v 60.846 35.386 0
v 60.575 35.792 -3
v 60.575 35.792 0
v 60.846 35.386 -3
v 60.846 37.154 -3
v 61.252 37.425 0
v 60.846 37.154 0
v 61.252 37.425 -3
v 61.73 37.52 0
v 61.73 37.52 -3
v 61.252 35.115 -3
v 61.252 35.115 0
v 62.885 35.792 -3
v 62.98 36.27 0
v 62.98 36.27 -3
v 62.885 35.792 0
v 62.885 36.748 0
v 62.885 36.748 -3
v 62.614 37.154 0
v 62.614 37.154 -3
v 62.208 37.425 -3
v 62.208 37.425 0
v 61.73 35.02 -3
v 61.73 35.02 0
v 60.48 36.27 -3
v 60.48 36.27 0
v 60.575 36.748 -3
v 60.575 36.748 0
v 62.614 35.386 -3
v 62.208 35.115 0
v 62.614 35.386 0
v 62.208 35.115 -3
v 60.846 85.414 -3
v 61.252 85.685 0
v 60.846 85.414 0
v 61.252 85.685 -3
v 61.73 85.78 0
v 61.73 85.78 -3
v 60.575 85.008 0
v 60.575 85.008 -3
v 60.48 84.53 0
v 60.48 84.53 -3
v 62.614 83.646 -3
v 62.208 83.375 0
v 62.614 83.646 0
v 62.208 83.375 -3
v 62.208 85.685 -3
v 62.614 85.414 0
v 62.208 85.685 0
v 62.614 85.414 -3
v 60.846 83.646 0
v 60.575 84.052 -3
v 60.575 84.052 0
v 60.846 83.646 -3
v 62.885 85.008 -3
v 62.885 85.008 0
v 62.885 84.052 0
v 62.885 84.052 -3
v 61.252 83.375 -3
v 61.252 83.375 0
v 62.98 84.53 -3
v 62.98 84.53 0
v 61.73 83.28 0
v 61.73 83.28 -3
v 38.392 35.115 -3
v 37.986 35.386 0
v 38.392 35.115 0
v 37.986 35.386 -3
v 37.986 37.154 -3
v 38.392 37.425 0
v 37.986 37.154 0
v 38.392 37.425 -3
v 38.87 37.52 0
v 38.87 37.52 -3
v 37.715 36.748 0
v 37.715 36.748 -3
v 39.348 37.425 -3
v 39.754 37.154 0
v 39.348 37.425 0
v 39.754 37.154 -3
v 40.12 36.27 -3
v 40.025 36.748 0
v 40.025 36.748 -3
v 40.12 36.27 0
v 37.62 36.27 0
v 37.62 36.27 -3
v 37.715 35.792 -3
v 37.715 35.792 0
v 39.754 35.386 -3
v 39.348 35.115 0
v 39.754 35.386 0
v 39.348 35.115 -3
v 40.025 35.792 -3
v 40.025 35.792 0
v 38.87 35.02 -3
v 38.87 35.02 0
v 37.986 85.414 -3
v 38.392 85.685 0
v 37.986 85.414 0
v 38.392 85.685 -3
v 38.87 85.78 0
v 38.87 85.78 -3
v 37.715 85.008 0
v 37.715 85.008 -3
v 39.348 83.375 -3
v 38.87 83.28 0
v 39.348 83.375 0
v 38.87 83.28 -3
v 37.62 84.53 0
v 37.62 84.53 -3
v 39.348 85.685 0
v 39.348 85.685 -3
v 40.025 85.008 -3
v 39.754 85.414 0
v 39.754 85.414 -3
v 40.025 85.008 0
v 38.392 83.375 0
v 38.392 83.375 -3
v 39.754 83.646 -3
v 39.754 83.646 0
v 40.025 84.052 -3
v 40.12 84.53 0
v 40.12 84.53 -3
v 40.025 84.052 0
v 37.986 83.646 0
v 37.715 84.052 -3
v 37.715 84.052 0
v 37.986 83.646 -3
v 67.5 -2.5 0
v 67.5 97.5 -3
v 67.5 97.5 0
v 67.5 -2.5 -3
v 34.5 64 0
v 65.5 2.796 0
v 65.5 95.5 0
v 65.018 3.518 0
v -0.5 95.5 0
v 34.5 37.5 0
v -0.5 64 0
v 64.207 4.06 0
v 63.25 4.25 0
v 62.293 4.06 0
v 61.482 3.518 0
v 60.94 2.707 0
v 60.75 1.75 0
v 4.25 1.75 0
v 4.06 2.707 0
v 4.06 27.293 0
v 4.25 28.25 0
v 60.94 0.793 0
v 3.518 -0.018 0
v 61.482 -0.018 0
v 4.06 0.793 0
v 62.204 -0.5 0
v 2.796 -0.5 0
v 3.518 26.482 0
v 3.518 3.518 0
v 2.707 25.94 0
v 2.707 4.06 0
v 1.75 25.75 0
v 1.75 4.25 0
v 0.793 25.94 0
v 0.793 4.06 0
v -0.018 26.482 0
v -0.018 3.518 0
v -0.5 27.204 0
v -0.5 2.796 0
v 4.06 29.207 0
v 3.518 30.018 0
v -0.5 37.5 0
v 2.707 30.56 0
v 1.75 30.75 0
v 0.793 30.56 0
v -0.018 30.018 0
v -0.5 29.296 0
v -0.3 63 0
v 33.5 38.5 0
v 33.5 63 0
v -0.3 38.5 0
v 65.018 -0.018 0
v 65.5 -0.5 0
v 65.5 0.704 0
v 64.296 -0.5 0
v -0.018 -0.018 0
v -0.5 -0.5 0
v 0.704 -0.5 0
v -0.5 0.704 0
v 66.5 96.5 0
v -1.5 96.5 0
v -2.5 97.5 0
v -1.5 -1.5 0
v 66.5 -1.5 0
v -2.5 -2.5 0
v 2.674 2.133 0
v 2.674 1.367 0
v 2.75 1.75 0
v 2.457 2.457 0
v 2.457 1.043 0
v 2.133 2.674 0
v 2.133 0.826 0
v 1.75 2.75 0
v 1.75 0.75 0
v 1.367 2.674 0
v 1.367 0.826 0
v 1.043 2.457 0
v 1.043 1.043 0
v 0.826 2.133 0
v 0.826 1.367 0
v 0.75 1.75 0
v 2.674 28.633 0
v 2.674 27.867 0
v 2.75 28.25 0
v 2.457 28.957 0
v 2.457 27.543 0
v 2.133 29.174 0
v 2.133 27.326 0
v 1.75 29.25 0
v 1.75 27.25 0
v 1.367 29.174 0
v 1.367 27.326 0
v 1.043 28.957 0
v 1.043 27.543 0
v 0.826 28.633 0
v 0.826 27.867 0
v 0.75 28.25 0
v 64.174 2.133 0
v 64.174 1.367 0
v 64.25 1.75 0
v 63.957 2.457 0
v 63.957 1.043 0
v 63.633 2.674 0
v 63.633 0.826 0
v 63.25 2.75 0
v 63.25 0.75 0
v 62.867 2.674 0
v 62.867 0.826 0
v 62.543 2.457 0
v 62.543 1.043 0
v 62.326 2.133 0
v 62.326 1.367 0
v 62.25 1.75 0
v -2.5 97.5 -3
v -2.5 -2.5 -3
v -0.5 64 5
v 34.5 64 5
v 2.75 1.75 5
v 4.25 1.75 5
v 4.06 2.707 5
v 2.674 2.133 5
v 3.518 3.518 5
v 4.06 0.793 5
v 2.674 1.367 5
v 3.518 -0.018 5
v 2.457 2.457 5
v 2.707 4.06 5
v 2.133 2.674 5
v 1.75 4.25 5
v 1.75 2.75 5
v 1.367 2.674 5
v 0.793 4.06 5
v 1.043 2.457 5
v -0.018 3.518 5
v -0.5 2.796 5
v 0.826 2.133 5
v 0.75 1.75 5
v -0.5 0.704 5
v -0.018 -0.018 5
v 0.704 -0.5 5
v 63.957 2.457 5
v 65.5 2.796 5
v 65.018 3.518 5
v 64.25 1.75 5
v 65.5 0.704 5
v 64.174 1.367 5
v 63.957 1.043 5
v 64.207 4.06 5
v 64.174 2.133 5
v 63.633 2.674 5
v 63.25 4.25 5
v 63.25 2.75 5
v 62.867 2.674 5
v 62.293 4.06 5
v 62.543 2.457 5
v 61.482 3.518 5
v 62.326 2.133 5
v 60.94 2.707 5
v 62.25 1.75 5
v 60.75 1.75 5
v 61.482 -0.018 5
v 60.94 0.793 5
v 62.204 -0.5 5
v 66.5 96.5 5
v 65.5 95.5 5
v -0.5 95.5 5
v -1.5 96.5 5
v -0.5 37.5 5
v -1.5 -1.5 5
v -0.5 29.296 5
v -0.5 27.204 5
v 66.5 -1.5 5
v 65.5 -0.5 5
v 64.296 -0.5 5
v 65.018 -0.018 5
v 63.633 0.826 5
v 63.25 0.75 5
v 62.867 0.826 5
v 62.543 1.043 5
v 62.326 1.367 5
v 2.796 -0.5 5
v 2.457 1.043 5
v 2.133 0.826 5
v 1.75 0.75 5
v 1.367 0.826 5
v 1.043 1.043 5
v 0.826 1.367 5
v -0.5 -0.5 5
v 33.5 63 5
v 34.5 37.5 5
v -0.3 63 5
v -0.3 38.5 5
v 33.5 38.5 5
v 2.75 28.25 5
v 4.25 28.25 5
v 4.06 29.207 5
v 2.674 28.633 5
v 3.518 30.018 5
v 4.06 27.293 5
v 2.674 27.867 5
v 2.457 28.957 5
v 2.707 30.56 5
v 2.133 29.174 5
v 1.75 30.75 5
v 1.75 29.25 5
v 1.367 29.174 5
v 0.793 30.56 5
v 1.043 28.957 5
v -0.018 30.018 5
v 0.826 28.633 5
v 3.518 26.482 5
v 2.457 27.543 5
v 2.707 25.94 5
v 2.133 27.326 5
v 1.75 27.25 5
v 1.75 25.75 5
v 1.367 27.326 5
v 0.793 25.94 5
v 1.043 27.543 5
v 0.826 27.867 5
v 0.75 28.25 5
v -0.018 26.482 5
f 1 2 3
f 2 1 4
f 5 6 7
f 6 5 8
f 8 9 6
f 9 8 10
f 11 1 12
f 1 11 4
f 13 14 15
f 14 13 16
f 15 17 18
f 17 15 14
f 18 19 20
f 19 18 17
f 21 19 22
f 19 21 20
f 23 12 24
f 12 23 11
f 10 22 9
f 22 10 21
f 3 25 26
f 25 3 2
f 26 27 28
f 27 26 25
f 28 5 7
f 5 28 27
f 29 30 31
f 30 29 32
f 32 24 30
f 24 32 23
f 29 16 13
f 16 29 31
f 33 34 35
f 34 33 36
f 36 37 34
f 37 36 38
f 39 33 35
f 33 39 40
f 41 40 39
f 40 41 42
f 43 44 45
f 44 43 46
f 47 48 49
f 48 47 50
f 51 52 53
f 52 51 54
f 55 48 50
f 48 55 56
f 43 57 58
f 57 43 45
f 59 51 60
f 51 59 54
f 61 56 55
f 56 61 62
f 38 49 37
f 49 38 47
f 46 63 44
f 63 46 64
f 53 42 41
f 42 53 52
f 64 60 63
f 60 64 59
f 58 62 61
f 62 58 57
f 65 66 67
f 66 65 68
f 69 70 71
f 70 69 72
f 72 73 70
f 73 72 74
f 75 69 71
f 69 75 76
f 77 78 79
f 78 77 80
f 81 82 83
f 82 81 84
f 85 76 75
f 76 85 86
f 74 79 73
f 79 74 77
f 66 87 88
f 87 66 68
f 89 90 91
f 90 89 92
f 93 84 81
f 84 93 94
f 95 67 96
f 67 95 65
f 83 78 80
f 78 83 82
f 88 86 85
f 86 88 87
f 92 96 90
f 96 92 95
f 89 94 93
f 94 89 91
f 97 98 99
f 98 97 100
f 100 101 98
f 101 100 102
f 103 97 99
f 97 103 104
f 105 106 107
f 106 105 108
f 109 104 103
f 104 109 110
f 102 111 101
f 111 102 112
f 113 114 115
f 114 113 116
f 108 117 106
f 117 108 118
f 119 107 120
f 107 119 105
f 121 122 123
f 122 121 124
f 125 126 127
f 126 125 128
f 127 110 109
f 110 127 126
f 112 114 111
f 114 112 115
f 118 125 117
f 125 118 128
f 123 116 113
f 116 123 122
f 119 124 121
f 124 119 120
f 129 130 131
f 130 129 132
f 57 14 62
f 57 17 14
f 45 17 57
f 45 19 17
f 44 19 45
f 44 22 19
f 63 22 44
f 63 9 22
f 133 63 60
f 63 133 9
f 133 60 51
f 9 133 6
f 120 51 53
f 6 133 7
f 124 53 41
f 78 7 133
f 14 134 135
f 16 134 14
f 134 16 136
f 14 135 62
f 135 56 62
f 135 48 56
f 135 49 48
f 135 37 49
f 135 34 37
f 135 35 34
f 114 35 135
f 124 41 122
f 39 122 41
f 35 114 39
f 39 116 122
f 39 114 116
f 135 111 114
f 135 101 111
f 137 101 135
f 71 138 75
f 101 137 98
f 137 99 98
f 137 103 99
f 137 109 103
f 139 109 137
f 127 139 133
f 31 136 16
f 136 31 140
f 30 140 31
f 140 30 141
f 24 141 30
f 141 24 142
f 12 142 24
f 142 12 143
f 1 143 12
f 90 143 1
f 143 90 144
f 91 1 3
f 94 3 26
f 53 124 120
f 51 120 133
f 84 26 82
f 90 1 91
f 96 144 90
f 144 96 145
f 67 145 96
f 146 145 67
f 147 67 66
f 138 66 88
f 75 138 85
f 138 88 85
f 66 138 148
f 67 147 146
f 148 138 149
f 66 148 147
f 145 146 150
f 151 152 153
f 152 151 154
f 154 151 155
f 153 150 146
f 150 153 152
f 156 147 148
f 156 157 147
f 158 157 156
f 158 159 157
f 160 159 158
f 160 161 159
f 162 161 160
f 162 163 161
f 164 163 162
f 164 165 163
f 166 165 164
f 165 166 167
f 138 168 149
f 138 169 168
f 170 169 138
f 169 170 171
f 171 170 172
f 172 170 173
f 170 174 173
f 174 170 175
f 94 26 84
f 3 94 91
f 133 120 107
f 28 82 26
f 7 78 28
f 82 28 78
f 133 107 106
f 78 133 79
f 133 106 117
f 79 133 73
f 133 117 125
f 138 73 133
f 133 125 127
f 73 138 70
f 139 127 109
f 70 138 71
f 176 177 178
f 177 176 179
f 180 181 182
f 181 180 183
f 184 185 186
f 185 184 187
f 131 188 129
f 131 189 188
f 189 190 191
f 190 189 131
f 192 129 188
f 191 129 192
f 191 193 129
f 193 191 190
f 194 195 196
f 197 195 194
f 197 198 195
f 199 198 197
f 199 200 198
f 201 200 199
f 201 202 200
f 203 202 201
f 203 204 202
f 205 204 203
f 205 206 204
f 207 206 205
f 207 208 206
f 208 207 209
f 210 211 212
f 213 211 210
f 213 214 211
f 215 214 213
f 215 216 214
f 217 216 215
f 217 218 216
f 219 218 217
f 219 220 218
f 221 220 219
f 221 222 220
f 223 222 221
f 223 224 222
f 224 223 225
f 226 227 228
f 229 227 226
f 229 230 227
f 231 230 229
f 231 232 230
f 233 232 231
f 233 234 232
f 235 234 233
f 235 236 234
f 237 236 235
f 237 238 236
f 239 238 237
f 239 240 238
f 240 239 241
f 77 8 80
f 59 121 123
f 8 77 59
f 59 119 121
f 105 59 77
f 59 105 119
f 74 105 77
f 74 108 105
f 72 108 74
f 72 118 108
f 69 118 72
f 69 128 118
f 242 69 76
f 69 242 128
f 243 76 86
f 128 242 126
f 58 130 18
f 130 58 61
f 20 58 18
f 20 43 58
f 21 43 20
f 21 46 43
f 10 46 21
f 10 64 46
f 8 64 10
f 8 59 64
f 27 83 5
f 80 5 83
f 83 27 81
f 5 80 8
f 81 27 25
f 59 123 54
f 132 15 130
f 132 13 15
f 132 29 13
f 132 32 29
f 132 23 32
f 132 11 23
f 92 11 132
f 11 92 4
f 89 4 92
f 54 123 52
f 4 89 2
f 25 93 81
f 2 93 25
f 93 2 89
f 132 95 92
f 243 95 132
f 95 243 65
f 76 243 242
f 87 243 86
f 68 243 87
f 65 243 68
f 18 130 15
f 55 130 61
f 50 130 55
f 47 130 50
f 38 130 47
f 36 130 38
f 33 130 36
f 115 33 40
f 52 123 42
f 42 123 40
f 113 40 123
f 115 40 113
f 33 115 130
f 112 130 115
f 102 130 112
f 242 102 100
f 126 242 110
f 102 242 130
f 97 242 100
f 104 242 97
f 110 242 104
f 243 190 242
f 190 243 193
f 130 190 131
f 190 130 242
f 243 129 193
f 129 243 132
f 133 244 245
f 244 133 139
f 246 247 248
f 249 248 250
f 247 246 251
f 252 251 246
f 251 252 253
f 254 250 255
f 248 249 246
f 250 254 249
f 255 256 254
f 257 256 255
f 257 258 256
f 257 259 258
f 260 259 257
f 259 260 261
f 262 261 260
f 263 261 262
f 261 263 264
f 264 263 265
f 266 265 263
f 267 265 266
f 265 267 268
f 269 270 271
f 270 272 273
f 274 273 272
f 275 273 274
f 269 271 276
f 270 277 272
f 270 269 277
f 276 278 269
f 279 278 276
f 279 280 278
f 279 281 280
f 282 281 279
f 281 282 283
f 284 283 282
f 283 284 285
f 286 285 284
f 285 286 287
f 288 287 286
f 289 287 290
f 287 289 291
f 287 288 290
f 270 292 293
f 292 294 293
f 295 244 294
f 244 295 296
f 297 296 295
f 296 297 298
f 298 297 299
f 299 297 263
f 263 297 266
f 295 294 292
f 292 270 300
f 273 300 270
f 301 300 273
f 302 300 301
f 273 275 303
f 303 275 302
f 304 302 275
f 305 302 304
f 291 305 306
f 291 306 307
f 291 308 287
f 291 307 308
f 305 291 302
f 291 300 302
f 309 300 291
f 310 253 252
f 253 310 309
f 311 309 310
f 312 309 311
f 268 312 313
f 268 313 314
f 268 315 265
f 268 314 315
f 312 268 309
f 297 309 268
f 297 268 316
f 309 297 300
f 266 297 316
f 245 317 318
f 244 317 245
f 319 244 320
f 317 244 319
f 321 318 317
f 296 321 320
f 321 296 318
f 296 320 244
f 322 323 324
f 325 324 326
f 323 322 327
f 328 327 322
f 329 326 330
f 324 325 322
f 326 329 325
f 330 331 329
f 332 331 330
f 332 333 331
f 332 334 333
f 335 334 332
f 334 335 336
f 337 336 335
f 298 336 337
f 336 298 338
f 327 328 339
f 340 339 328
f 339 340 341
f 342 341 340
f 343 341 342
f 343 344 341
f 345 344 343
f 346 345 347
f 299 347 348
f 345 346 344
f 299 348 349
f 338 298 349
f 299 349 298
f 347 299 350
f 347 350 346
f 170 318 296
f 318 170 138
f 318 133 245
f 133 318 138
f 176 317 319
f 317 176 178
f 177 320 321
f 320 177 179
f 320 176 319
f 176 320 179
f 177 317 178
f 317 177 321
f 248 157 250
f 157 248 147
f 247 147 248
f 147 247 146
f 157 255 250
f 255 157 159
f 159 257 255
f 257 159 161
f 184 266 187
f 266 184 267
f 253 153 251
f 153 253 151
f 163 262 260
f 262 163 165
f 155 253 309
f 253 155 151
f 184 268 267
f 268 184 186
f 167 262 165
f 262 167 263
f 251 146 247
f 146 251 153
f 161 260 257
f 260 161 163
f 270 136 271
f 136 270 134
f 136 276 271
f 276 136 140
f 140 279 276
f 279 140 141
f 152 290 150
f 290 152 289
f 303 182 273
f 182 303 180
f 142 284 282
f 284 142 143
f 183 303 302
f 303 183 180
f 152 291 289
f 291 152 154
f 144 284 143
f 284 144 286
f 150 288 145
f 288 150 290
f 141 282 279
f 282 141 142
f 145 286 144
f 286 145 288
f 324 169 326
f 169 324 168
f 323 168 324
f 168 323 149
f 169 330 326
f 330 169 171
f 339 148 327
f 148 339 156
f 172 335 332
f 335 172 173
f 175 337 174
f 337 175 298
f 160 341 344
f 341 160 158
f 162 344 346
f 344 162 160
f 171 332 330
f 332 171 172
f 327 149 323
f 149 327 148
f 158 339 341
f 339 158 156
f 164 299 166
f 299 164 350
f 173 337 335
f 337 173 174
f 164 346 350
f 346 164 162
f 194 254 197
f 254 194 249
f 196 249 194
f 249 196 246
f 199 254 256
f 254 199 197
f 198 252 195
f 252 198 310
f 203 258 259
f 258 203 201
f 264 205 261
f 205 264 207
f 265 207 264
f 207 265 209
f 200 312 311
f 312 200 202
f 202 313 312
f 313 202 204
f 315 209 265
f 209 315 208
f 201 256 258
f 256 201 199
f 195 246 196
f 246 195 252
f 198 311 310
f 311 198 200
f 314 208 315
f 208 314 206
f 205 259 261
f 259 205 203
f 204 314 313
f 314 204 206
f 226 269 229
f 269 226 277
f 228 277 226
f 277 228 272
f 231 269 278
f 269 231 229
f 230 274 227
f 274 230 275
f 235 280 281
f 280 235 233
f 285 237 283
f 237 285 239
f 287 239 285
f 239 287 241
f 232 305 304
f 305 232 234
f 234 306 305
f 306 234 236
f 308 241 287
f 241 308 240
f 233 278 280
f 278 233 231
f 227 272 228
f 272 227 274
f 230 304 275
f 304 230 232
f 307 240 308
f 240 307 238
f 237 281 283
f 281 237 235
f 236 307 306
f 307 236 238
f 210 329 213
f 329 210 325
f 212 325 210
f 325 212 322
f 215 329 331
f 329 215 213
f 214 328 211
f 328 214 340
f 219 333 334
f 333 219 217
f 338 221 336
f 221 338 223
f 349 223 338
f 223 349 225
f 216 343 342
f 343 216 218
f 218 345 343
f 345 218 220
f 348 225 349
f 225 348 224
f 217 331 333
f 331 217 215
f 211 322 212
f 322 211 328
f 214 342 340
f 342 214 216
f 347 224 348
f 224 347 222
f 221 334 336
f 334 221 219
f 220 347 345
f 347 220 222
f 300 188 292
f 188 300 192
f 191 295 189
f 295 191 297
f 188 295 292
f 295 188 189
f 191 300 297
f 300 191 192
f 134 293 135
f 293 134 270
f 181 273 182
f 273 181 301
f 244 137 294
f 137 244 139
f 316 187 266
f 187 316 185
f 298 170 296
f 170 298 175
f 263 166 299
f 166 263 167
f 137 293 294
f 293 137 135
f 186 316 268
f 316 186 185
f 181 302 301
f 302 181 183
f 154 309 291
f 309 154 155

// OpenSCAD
// file: boards.scad
pi_pcb_thick = 1.6; 
pi_x = 65.0; 
pi_y = 30.0; 
pi_thru_hole_offset = 3.5; 

pm25_x = 21.5; 
pm25_y = 30.8;
pm25_z = 50.025; 

inch2mm = 25.4;

/* 
 * define pi zero dims 
   https://www.raspberrypi.org/documentation/hardware/raspberrypi/mechanical/README.md   
   holes are for M2.5
 * 
 */
module board_pi_zero_w(){
    x = pi_x; 
    y = pi_y;
    z = pi_pcb_thick;  // pcb thickness
    
    
    difference() {
    color("green") cube([x,y,z]); // primary board
    pi_zero_thru_holes(x,y,z);
    }
    board_pi_zero_sdcard();
    board_pi_zero_usb_pwr();
}

module pi_zero_thru_holes(x,y,z){
    
        thru_hole_diam = 2.5; 
        thru_hole_offset = pi_thru_hole_offset; // all holes are 3.5 mm from edges in both directions

        translate([thru_hole_offset/2, thru_hole_offset/2,0])
            cylinder(r=thru_hole_diam/2,h=10,$fn=16);
        translate([x-thru_hole_offset/2, thru_hole_offset/2,0])
            cylinder(r=thru_hole_diam/2,h=10,$fn=16);
        translate([thru_hole_offset/2, y-thru_hole_offset/2,0])
            cylinder(r=thru_hole_diam/2,h=10,$fn=16);
        translate([x-thru_hole_offset/2, y-thru_hole_offset/2,0])
            cylinder(r=thru_hole_diam/2,h=10,$fn=16);
}

module board_pi_zero_sdcard(){
    
    //pi_pcb_thick=1.6; 
    sd_card_center_offset=16.9;
    sd_card_x = 12.4;
    sd_card_y = 12.4; 
    sd_card_thick = 3;
    translate([0,sd_card_center_offset-sd_card_y/2,pi_pcb_thick])
        cube([sd_card_x,sd_card_y,sd_card_thick]);
}

module board_pi_zero_usb_pwr(){
    usb_offset = 54;
    usb_width = 8.2;
    usb_thick = 3.25; 
    //pi_pcb_thick=1.6; 
    translate([usb_offset-usb_width/2,0,pi_pcb_thick])
        cube([usb_width,usb_width,usb_thick]);
    
}

/* this is the CO2 sensor SDC30
 * other boards stack on it
 * https://learn.adafruit.com/adafruit-scd30/downloads
 */
module SCD30_board(){
    // original dimensions in inches
    x = 2.0*inch2mm;
    y = 1.0*inch2mm;
    z = 2.0; // not too critical
    
    // hole offsets are the same from each corner
    thru_hole_offset =  (1.0-0.8)/2 * inch2mm;
    thru_hole_diam = 2.5; 
    
    difference(){
        color("blue") cube([x,y,z]);
        translate([thru_hole_offset/2, thru_hole_offset/2,0])
            cylinder(r=thru_hole_diam/2,h=10,$fn=16);
        translate([x-thru_hole_offset/2, thru_hole_offset/2,0])
            cylinder(r=thru_hole_diam/2,h=10,$fn=16);
        translate([thru_hole_offset/2, y-thru_hole_offset/2,0])
            cylinder(r=thru_hole_diam/2,h=10,$fn=16);
        translate([x-thru_hole_offset/2, y-thru_hole_offset/2,0])
            cylinder(r=thru_hole_diam/2,h=10,$fn=16);
    }
}

/* this is the Plantower 2.5 particulate matter sensor
*/  
module plantower_pm25(){
    x = pm25_x;
    y = pm25_y;
    z = pm25_z;
    color("blue") cube([x,y,z]);
}
// main file
// include the external boards for reference
include <boards.scad>;

pm25_offset_x = 32;
pm25_offset_y = 40;
pm25_rotate = 90;

pi_standoff_height=5.0;
pi_standoff_diam=5;

// basic base
module base(){
    x = 70; 
    y = 100; 
    z = 3;
    
    difference(){
    translate([-2.5,-2.5,-z])cube([x,y,z]);
    // add holes for SDC30 standoffs - 

    thru_hole_offset =  (1.0-0.8)/2 * inch2mm;
    thru_hole_diam = 2.5; 
    translate([63,35,-10])rotate([0,0,90])
        union(){
            x=2.0*inch2mm;
            y=1.0*inch2mm;
            z=2.0;
    translate([thru_hole_offset/2, thru_hole_offset/2,0])
        cylinder(r=thru_hole_diam/2,h=20,$fn=16);
    translate([x-thru_hole_offset/2, thru_hole_offset/2,0])
        cylinder(r=thru_hole_diam/2,h=20,$fn=16);
    translate([thru_hole_offset/2, y-thru_hole_offset/2,0])
        cylinder(r=thru_hole_diam/2,h=20,$fn=16);
    translate([x-thru_hole_offset/2, y-thru_hole_offset/2,0])
        cylinder(r=thru_hole_diam/2,h=20,$fn=16);
        }
            
}
        
        
    // the base needs a slot to hold the pm2.5 sensor
    // dimensions loaded from include file
    slot_height=5.0;
    slot_width=5;
    slot_wall_thick=2.0;
    translate([pm25_offset_x+slot_width/2,pm25_offset_y-slot_width/2,0]) rotate([0,0,pm25_rotate])
    difference(){
    cube([pm25_x+slot_width,pm25_y+slot_width,slot_height]);
        translate([slot_wall_thick/2,slot_wall_thick/2,0])
        cube([pm25_x+slot_width-slot_wall_thick,pm25_y+slot_width-slot_wall_thick,slot_height]);
    }
    
    // create standoffs for the raspberry pi
    difference(){
        union(){
            translate([pi_thru_hole_offset/2, pi_thru_hole_offset/2,0])
              cylinder(r=pi_standoff_diam/2,h=pi_standoff_height,$fn=16);
            translate([pi_x-pi_thru_hole_offset/2, pi_thru_hole_offset/2,0])
              cylinder(r=pi_standoff_diam/2,h=pi_standoff_height,$fn=16);
            translate([pi_thru_hole_offset/2, pi_y-pi_thru_hole_offset/2,0])
              cylinder(r=pi_standoff_diam/2,h=pi_standoff_height,$fn=16);
            translate([pi_x-pi_thru_hole_offset/2, pi_y-pi_thru_hole_offset/2,0])
              cylinder(r=pi_standoff_diam/2,h=pi_standoff_height,$fn=16);
        }//end union
        union(){
            standoff_hole_diam=2.0;
            translate([pi_thru_hole_offset/2, pi_thru_hole_offset/2,0])
              cylinder(r=standoff_hole_diam/2,h=pi_standoff_height,$fn=16);
            translate([pi_x-pi_thru_hole_offset/2, pi_thru_hole_offset/2,0])
              cylinder(r=standoff_hole_diam/2,h=pi_standoff_height,$fn=16);
            translate([pi_thru_hole_offset/2, pi_y-pi_thru_hole_offset/2,0])
              cylinder(r=standoff_hole_diam/2,h=pi_standoff_height,$fn=16);
            translate([pi_x-pi_thru_hole_offset/2, pi_y-pi_thru_hole_offset/2,0])
              cylinder(r=pi_standoff_diam/2,h=pi_standoff_height,$fn=16);
        }//end union
    
    }//end  difference   
    
    // add edge rim to hold top in place
    edge_rim_thick = 2.0;
    edge_rim_gap = 1.0;
    edge_rim_height = 5.0;
    translate([-2.5,-2.5,0])
    translate([edge_rim_gap,edge_rim_gap,0])
    
    difference(){
        cube([x-edge_rim_gap*2,y-edge_rim_gap*2,edge_rim_height]);
        translate([edge_rim_gap,edge_rim_gap,0])cube([x-edge_rim_gap*2-edge_rim_thick,y-edge_rim_gap*2-edge_rim_thick,edge_rim_height]);  
    }
    

}



//translate([0,0,pi_standoff_height])board_pi_zero_w();
//translate([63,35,0])rotate([0,0,90]) SCD30_board();
//translate([pm25_offset_x,pm25_offset_y,0]) rotate([0,0,pm25_rotate]) plantower_pm25();

base();
